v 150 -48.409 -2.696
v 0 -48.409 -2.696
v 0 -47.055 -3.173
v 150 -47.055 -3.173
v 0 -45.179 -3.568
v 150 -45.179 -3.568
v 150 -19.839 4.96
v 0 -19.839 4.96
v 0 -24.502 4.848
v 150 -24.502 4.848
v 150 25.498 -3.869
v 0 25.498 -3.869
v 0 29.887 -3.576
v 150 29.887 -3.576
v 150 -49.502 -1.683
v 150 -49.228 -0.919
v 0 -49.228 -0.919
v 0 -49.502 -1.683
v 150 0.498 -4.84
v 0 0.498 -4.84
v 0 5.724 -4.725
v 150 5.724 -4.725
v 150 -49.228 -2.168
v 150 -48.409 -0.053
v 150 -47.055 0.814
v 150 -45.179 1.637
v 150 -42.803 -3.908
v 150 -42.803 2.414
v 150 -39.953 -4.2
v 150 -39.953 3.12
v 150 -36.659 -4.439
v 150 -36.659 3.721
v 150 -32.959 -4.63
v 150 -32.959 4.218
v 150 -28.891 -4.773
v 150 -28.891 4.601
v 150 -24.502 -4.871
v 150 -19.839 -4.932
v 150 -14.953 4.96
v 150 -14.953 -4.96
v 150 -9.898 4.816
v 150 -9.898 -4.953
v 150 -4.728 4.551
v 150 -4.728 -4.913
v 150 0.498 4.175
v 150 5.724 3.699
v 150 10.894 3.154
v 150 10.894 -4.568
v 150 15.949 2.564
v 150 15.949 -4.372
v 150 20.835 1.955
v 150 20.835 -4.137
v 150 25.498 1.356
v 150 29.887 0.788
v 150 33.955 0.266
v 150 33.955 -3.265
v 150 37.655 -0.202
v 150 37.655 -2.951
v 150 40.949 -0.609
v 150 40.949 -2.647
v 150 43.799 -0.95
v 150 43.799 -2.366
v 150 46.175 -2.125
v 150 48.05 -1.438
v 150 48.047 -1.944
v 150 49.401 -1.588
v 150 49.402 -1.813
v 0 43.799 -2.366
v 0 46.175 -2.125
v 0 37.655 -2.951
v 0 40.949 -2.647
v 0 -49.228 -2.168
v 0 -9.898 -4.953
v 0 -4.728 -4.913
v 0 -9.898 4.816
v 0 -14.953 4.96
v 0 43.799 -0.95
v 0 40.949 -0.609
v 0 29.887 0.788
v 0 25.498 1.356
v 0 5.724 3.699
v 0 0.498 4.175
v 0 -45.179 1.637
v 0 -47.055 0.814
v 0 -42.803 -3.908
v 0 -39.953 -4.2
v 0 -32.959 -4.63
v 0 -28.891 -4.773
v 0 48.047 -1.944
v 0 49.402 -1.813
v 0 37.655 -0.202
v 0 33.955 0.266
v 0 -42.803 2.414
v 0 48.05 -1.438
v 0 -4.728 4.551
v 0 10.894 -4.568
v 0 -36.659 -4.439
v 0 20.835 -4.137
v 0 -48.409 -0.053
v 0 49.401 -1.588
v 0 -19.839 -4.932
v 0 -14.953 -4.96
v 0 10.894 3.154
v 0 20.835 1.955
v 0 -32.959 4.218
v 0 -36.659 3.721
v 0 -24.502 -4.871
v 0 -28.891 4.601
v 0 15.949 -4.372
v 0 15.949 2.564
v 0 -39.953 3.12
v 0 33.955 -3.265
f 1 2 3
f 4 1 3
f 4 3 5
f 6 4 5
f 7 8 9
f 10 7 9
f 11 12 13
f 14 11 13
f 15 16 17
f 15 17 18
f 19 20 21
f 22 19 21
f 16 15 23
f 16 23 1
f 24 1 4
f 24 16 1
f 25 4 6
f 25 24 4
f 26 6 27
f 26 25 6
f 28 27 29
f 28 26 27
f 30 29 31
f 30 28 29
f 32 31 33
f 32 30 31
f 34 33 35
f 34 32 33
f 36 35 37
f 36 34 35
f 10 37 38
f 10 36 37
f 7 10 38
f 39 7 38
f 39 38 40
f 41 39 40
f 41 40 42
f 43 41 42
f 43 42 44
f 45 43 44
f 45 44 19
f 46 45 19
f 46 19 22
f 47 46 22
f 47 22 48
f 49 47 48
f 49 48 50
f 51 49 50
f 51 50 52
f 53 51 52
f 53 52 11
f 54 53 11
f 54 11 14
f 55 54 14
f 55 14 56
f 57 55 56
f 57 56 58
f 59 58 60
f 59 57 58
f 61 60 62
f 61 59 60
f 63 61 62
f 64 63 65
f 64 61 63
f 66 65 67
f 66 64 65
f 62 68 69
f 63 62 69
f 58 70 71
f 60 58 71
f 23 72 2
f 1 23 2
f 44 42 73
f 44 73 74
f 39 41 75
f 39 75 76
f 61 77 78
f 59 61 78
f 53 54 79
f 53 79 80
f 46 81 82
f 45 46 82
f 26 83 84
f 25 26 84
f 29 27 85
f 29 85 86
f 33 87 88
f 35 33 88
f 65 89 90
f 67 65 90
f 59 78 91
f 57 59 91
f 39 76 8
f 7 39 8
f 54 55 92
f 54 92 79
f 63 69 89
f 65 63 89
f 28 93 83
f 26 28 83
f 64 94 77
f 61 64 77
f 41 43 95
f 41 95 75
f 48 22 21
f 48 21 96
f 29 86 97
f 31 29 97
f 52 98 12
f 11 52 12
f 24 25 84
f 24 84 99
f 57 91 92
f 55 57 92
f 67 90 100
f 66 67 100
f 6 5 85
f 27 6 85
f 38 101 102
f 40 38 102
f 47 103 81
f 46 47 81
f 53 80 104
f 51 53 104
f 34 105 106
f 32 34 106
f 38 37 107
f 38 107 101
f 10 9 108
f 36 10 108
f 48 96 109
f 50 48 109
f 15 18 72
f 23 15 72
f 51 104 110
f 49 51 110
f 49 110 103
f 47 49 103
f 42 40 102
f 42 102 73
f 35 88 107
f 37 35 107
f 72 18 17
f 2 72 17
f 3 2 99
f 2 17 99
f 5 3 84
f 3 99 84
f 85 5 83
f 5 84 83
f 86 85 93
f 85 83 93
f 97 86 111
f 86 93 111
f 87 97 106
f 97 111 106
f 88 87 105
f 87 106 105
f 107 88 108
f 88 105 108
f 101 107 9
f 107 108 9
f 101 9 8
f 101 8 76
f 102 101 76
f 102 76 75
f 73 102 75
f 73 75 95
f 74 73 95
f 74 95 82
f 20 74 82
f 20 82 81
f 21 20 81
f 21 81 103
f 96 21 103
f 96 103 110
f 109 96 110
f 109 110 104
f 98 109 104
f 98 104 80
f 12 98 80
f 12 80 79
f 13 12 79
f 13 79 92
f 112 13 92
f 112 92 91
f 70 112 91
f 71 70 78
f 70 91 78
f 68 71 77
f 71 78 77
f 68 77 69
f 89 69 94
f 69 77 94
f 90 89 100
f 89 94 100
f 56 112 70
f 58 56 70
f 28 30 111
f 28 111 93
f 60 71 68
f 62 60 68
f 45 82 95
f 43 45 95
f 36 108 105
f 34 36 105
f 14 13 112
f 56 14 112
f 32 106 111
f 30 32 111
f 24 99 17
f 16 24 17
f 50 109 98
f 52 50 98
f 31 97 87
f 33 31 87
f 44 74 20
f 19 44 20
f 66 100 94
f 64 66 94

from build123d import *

# Parameters (mm, degrees)
F1_DEPTH = 150


with BuildPart() as f1:
    # F0 (on Right) → F1 (new body)
    with BuildSketch(Plane.YZ):
        Polygon((49.401502, -1.812943), (49.401429, -1.587792), (48.049564, -1.438415), (43.798746, -0.95), (40.948746, -0.609), (37.654746, -0.202), (33.954746, 0.266), (29.886746, 0.788), (25.497746, 1.356), (20.834746, 1.955), (15.948746, 2.564), (10.893746, 3.154), (5.723746, 3.699), (0.497746, 4.175), (-4.728254, 4.551), (-9.898254, 4.816), (-14.953254, 4.96), (-19.839254, 4.96), (-24.502254, 4.848), (-28.891254, 4.601), (-32.959254, 4.218), (-36.659254, 3.721), (-39.953254, 3.12), (-42.803254, 2.414), (-45.179254, 1.637), (-47.055254, 0.814), (-48.409254, -0.053), (-49.228254, -0.919), (-49.502254, -1.683), (-49.228254, -2.168), (-48.409254, -2.696), (-47.055254, -3.173), (-45.179254, -3.568), (-42.803254, -3.908), (-39.953254, -4.2), (-36.659254, -4.439), (-32.959254, -4.63), (-28.891254, -4.773), (-24.502254, -4.871), (-19.839254, -4.932), (-14.953254, -4.96), (-9.898254, -4.953), (-4.728254, -4.913), (0.497746, -4.84), (5.723746, -4.725), (10.893746, -4.568), (15.948746, -4.372), (20.834746, -4.137), (25.497746, -3.869), (29.886746, -3.576), (33.954746, -3.265), (37.654746, -2.951), (40.948746, -2.647), (43.798746, -2.366), (46.174746, -2.125), (48.046751, -1.944415), align=None)
    extrude(amount=F1_DEPTH)


solid = f1.part
